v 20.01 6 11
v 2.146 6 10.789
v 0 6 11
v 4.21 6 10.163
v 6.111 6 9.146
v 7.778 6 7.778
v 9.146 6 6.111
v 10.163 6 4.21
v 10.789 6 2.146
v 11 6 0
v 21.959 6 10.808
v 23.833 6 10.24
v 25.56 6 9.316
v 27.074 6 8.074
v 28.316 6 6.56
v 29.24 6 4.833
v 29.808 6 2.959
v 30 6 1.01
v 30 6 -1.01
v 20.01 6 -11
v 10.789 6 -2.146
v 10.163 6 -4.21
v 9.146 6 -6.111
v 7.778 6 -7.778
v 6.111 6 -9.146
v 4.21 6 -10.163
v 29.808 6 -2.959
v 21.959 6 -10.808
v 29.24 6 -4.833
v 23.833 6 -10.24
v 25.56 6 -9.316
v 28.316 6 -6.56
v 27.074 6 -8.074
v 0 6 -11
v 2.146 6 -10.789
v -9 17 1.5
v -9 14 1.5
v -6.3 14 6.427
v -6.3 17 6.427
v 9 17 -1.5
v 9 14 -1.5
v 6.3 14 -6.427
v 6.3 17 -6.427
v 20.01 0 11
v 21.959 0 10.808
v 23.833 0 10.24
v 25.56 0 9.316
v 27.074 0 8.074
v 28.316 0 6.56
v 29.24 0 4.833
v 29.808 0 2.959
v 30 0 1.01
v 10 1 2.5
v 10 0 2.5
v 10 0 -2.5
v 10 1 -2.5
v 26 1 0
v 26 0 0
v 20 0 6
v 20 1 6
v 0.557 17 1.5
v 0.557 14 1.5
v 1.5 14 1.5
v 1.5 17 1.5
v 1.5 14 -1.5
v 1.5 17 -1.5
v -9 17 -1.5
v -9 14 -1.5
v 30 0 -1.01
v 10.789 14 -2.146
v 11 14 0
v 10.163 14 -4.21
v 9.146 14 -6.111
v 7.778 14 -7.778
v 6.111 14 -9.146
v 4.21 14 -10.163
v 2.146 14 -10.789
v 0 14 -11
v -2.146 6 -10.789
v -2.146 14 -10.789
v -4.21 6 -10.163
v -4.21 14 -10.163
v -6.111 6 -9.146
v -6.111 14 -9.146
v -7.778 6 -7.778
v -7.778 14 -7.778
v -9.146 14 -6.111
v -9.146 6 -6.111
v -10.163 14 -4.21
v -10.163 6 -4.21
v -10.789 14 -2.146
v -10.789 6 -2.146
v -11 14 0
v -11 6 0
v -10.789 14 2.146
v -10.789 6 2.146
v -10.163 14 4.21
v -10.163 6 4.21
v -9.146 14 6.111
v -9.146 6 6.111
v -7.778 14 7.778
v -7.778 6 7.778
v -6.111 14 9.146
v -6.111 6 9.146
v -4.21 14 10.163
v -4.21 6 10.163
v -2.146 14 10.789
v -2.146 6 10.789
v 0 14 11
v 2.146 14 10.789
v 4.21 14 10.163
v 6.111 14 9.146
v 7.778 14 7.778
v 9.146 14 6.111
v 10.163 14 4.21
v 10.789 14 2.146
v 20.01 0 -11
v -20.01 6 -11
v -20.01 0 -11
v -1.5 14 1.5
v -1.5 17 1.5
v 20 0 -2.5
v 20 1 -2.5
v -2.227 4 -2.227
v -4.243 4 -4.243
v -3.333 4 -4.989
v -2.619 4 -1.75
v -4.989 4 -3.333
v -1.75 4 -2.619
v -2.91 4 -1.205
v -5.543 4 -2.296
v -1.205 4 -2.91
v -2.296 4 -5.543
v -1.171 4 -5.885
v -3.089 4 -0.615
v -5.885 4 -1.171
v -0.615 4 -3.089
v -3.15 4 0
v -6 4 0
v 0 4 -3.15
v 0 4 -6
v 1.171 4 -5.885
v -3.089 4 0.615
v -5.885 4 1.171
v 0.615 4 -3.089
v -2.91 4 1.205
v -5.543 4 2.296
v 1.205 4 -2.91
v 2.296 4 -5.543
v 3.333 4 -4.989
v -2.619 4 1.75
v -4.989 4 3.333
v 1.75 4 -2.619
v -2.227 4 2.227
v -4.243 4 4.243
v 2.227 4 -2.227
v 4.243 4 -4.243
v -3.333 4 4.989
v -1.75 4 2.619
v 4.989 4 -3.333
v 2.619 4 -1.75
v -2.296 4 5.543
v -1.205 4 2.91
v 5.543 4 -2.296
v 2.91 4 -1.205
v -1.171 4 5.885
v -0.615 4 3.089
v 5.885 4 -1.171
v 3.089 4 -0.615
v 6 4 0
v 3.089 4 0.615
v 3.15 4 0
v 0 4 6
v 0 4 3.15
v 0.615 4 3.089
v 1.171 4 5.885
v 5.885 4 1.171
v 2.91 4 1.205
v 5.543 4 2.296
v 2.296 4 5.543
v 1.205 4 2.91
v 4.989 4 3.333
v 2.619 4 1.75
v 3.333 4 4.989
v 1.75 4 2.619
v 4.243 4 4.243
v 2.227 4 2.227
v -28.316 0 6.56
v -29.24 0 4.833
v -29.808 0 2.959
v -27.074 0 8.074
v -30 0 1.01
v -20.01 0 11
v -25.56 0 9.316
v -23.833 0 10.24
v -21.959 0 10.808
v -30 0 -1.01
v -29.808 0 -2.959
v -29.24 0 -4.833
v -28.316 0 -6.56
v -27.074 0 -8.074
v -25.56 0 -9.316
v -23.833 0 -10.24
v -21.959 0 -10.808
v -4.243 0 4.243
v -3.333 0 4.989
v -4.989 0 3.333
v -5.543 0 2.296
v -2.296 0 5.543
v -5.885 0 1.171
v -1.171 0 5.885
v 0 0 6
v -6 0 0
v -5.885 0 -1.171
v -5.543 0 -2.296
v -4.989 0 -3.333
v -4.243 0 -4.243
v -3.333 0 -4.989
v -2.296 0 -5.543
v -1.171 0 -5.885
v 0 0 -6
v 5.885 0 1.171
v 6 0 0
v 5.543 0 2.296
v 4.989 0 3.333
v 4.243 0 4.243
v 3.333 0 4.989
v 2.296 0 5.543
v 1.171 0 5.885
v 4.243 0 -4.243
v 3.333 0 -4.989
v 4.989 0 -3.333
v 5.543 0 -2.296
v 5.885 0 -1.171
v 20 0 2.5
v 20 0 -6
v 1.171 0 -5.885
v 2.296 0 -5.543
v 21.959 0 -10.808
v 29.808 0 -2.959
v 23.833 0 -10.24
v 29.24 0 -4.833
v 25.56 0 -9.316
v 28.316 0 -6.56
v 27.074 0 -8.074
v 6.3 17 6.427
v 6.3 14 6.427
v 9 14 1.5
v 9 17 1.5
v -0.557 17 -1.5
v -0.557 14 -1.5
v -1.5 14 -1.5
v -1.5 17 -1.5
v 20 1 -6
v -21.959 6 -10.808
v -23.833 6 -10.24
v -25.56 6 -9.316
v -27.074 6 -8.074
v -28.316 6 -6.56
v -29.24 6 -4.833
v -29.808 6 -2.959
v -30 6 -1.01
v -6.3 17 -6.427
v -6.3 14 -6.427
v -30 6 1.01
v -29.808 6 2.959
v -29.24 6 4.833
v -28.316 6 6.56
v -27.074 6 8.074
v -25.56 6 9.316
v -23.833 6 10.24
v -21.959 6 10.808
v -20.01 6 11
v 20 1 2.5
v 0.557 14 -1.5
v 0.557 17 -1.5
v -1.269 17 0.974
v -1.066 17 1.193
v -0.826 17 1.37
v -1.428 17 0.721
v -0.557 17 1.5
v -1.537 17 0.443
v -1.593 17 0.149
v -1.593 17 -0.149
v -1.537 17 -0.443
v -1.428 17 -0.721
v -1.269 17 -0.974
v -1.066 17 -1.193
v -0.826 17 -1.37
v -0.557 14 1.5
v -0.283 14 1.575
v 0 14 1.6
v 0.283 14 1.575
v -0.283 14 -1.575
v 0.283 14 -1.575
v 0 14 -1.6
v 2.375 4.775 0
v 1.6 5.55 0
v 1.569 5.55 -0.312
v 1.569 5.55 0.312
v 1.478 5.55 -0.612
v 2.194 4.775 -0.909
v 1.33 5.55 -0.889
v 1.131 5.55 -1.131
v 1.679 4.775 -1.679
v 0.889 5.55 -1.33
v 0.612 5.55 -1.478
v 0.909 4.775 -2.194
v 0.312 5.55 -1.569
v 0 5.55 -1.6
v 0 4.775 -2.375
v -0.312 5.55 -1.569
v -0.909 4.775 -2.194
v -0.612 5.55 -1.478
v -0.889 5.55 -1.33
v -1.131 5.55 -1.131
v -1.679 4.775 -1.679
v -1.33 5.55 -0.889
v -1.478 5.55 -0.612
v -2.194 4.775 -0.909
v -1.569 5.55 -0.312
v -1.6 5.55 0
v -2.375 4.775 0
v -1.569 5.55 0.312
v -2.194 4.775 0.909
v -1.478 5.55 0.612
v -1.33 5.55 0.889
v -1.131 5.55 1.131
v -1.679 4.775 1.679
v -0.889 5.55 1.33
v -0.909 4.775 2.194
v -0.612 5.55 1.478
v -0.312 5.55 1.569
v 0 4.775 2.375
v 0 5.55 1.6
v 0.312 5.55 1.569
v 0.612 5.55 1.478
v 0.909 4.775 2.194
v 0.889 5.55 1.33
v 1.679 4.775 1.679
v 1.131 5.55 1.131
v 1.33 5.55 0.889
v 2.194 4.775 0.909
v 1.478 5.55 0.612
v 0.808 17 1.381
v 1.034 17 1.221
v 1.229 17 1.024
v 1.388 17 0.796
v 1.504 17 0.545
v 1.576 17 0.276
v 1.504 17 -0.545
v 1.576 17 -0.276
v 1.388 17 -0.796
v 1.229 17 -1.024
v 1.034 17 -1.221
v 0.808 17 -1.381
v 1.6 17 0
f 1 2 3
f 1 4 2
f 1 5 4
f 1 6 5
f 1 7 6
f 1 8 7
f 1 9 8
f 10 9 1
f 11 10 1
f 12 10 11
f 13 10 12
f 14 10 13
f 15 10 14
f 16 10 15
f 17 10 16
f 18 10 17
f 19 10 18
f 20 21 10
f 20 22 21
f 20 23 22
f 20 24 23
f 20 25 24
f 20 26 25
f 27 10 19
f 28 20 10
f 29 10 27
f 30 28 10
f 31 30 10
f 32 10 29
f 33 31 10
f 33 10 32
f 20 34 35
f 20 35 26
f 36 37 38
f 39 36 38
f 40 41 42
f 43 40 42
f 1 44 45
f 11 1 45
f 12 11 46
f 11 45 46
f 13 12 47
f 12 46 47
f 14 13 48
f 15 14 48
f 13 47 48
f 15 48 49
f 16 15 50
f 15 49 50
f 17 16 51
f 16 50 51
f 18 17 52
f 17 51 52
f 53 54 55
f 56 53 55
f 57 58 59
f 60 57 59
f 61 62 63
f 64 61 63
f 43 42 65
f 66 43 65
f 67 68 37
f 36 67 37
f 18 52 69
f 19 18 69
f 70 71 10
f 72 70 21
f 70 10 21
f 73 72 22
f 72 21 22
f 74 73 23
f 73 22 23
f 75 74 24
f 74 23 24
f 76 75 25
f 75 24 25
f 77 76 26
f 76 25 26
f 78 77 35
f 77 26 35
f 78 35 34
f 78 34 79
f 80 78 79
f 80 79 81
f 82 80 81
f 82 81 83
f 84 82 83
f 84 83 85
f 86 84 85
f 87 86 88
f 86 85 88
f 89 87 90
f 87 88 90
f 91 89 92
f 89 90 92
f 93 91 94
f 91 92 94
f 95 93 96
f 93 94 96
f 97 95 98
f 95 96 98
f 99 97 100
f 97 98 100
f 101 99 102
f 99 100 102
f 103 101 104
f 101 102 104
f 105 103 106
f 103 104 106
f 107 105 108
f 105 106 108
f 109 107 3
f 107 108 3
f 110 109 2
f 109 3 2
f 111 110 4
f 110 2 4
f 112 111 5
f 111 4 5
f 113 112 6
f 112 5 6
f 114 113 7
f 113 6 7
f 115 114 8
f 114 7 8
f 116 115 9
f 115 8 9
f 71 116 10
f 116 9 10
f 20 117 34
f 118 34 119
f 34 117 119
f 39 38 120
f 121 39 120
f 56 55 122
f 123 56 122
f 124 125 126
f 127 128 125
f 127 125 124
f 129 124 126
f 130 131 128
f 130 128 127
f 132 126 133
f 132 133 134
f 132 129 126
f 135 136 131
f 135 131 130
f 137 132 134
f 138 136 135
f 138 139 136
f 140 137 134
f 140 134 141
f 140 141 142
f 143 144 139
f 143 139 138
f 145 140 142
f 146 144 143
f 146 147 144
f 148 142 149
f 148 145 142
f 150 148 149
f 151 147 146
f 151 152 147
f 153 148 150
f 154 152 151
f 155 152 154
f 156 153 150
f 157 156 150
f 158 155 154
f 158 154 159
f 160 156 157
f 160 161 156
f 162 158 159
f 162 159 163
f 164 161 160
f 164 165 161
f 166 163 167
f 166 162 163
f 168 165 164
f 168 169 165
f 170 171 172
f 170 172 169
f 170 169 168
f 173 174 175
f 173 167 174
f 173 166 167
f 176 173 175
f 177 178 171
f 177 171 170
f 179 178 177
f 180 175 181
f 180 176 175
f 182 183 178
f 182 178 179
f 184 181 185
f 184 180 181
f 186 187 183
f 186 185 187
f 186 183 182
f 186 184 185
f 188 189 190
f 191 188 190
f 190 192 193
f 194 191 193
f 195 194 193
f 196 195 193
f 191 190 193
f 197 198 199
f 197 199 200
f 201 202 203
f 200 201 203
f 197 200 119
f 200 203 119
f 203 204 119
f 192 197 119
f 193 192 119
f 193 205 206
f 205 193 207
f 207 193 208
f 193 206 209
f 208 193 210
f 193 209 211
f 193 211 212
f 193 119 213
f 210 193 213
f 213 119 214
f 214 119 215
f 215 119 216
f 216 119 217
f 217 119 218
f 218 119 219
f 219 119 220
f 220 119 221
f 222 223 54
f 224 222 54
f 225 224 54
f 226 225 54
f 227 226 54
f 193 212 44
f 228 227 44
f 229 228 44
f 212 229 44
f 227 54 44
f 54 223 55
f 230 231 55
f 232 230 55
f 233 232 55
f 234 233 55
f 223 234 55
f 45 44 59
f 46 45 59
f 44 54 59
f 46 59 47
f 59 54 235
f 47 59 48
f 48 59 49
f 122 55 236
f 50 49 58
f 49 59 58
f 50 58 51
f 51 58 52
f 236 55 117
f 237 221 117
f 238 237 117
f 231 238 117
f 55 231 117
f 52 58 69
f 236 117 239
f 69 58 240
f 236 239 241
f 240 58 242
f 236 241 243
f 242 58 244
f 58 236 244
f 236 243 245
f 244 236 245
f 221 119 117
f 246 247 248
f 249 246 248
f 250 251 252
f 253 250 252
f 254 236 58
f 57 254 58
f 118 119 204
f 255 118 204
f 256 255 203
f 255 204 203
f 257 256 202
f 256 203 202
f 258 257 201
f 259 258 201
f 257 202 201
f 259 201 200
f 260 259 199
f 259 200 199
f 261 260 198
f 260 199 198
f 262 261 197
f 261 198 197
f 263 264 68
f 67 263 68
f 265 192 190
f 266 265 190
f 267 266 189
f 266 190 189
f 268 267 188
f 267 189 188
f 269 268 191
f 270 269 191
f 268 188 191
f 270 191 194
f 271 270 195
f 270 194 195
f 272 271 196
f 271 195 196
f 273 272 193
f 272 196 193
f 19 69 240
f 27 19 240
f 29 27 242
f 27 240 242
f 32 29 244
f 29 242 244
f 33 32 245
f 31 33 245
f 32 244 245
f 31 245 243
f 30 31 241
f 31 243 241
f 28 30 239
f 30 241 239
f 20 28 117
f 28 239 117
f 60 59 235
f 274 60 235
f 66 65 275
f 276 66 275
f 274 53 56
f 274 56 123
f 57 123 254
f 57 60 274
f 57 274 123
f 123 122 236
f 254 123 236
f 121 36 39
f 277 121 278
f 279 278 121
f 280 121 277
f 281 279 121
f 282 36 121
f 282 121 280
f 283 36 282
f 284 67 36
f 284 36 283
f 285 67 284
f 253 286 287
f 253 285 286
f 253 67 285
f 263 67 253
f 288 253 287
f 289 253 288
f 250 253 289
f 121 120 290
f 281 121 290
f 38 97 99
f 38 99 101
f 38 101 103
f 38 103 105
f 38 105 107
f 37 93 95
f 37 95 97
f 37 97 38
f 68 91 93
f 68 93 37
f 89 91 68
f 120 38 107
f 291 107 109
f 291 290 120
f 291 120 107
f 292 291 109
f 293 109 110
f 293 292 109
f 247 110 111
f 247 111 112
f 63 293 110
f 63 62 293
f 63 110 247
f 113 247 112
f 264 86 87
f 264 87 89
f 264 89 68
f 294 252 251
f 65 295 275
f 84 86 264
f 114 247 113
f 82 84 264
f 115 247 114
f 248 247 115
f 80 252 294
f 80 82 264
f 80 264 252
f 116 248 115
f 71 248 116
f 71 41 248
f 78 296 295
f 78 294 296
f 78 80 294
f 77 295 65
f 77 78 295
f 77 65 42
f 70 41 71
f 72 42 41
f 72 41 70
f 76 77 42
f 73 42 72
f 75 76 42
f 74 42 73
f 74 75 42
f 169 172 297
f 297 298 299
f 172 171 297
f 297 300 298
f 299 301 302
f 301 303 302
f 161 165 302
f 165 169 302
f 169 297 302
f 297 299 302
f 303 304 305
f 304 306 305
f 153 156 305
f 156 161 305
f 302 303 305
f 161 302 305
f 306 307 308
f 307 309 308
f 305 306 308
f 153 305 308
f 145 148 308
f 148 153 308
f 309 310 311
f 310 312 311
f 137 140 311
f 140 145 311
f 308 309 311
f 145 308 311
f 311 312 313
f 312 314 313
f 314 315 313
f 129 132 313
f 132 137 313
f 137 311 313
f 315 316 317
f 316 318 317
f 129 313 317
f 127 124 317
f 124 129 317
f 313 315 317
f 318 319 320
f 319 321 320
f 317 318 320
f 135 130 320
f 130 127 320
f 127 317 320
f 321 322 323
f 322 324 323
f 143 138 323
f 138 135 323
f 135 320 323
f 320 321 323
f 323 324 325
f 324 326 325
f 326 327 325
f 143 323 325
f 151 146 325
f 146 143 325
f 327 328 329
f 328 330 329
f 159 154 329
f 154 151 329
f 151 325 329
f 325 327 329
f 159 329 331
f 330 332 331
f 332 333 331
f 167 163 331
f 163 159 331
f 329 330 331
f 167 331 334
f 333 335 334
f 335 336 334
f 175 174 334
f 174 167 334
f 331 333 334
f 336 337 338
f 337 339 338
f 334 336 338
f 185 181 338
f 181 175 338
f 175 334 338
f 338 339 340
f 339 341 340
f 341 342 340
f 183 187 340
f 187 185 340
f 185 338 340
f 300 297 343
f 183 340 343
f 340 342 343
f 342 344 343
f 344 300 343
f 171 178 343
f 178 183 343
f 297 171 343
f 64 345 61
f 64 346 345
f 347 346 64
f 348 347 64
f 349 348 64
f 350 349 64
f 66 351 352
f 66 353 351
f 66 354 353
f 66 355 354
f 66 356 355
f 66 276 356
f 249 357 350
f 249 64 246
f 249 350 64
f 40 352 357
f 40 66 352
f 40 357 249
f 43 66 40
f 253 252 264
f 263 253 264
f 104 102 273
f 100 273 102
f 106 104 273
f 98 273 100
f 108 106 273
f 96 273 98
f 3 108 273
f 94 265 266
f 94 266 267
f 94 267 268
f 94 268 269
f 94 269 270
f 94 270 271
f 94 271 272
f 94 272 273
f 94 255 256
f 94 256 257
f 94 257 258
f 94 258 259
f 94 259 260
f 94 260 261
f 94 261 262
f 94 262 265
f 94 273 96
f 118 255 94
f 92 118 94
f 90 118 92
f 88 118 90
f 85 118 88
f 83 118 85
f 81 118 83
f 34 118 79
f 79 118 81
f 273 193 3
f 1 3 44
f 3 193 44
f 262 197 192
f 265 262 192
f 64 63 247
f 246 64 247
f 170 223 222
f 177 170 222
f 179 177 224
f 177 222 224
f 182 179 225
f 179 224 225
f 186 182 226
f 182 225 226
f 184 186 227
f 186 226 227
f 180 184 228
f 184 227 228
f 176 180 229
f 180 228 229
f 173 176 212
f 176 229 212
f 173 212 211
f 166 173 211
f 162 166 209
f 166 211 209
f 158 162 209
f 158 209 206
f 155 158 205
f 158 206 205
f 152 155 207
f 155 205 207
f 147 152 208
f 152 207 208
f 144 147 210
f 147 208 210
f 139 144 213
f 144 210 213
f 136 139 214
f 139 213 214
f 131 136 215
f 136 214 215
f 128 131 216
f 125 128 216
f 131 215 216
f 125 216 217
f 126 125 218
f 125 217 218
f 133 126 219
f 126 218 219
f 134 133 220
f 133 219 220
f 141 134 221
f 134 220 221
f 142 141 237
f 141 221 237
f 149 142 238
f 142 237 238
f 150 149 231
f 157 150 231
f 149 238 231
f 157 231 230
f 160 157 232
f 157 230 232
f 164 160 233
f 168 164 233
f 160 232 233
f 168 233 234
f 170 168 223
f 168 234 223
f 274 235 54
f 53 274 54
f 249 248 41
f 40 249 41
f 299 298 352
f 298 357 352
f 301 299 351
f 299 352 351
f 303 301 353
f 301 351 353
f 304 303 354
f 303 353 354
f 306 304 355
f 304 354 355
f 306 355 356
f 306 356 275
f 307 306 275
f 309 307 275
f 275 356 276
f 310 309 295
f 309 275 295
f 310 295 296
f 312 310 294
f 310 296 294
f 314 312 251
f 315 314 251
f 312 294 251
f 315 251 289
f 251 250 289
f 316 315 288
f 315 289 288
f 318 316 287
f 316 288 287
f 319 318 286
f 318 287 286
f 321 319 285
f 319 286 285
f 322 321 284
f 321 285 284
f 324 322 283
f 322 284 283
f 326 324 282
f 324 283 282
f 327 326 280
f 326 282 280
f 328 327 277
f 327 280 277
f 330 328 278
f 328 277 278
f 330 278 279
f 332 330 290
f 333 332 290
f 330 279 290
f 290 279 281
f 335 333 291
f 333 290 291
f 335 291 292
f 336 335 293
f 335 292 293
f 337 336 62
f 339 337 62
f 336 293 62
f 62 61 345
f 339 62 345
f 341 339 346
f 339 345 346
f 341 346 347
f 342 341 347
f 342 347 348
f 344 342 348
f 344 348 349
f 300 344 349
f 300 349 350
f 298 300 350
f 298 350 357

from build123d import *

# Parameters (mm, degrees)
BOSS_EXTRUDE1_DEPTH                                 = 6
SKETCH2_R                                           = 11
BOSS_EXTRUDE2_DEPTH                                 = 8
SKETCH12_R                                          = 6
CUT_EXTRUDE2_DEPTH                                  = 4
BOSS_EXTRUDE3_DEPTH                                 = 3
CSK_FOR_M3_COUNTERSUNK_FLAT_HEAD_SCREW3_D           = 3.2
CSK_FOR_M3_COUNTERSUNK_FLAT_HEAD_SCREW3_CSINK_D     = 6.3
CSK_FOR_M3_COUNTERSUNK_FLAT_HEAD_SCREW3_CSINK_ANGLE = 90
CUT_EXTRUDE3_DEPTH                                  = 1


with BuildPart() as part:
    # Sketch1 → Boss-Extrude1 (new body)
    with BuildSketch(Plane(origin=(0, 0, 0), x_dir=(1, 0, 0), z_dir=(0, 1, 0))):
        with BuildLine():
            Line((-20.01, -11), (20.01, -11))
            ThreePointArc((20.01, -11), (27.073996744, -8.073996744), (30, -1.01))
            Line((30, -1.01), (30, 1.01))
            ThreePointArc((30, 1.01), (27.073996744, 8.073996744), (20.01, 11))
            Line((20.01, 11), (-20.01, 11))
            ThreePointArc((-20.01, 11), (-27.073996744, 8.073996744), (-30, 1.01))
            Line((-30, 1.01), (-30, -1.01))
            ThreePointArc((-30, -1.01), (-27.073996744, -8.073996744), (-20.01, -11))
        make_face()
    extrude(amount=BOSS_EXTRUDE1_DEPTH)

    # Sketch2 → Boss-Extrude2 (add)
    with BuildSketch(Plane(origin=(0, 6, 0), x_dir=(1, 0, 0), z_dir=(0, 1, 0))):
        Circle(SKETCH2_R)
    extrude(amount=BOSS_EXTRUDE2_DEPTH)

    # Sketch12 → Cut-Extrude2 (cut)
    with BuildSketch(Plane.XZ):
        Circle(SKETCH12_R)
    extrude(amount=-CUT_EXTRUDE2_DEPTH, mode=Mode.SUBTRACT)

    # Sketch19 → Boss-Extrude3 (add)
    with BuildSketch(Plane(origin=(0, 14, 0), x_dir=(1, 0, 0), z_dir=(0, 1, 0))):
        Polygon((-6.300393599, 6.426899758), (-9, 1.5), (-9, -1.5), (-6.300393599, -6.426899758), (-1.5, -1.5), (1.5, -1.5), (6.300393599, -6.426899758), (9, -1.5), (9, 1.5), (6.300393599, 6.426899758), (1.5, 1.5), (-1.5, 1.5), align=None)
    extrude(amount=BOSS_EXTRUDE3_DEPTH)

    # CSK for M3 Countersunk Flat Head Screw3 (through all)
    with Locations(Plane(origin=(0, 4, 0), x_dir=(-1, 0, 0), z_dir=(0, -1, 0))):
        with Locations((0, 0)):
            CounterSinkHole(CSK_FOR_M3_COUNTERSUNK_FLAT_HEAD_SCREW3_D / 2, CSK_FOR_M3_COUNTERSUNK_FLAT_HEAD_SCREW3_CSINK_D / 2, counter_sink_angle=CSK_FOR_M3_COUNTERSUNK_FLAT_HEAD_SCREW3_CSINK_ANGLE)

    # Sketch20 → Cut-Extrude3 (cut)
    with BuildSketch(Plane.XZ):
        Polygon((10, 2.5), (10, -2.5), (20, -2.5), (20, -6), (26, 0), (20, 6), (20, 2.5), align=None)
    extrude(amount=-CUT_EXTRUDE3_DEPTH, mode=Mode.SUBTRACT)


solid = part.part
